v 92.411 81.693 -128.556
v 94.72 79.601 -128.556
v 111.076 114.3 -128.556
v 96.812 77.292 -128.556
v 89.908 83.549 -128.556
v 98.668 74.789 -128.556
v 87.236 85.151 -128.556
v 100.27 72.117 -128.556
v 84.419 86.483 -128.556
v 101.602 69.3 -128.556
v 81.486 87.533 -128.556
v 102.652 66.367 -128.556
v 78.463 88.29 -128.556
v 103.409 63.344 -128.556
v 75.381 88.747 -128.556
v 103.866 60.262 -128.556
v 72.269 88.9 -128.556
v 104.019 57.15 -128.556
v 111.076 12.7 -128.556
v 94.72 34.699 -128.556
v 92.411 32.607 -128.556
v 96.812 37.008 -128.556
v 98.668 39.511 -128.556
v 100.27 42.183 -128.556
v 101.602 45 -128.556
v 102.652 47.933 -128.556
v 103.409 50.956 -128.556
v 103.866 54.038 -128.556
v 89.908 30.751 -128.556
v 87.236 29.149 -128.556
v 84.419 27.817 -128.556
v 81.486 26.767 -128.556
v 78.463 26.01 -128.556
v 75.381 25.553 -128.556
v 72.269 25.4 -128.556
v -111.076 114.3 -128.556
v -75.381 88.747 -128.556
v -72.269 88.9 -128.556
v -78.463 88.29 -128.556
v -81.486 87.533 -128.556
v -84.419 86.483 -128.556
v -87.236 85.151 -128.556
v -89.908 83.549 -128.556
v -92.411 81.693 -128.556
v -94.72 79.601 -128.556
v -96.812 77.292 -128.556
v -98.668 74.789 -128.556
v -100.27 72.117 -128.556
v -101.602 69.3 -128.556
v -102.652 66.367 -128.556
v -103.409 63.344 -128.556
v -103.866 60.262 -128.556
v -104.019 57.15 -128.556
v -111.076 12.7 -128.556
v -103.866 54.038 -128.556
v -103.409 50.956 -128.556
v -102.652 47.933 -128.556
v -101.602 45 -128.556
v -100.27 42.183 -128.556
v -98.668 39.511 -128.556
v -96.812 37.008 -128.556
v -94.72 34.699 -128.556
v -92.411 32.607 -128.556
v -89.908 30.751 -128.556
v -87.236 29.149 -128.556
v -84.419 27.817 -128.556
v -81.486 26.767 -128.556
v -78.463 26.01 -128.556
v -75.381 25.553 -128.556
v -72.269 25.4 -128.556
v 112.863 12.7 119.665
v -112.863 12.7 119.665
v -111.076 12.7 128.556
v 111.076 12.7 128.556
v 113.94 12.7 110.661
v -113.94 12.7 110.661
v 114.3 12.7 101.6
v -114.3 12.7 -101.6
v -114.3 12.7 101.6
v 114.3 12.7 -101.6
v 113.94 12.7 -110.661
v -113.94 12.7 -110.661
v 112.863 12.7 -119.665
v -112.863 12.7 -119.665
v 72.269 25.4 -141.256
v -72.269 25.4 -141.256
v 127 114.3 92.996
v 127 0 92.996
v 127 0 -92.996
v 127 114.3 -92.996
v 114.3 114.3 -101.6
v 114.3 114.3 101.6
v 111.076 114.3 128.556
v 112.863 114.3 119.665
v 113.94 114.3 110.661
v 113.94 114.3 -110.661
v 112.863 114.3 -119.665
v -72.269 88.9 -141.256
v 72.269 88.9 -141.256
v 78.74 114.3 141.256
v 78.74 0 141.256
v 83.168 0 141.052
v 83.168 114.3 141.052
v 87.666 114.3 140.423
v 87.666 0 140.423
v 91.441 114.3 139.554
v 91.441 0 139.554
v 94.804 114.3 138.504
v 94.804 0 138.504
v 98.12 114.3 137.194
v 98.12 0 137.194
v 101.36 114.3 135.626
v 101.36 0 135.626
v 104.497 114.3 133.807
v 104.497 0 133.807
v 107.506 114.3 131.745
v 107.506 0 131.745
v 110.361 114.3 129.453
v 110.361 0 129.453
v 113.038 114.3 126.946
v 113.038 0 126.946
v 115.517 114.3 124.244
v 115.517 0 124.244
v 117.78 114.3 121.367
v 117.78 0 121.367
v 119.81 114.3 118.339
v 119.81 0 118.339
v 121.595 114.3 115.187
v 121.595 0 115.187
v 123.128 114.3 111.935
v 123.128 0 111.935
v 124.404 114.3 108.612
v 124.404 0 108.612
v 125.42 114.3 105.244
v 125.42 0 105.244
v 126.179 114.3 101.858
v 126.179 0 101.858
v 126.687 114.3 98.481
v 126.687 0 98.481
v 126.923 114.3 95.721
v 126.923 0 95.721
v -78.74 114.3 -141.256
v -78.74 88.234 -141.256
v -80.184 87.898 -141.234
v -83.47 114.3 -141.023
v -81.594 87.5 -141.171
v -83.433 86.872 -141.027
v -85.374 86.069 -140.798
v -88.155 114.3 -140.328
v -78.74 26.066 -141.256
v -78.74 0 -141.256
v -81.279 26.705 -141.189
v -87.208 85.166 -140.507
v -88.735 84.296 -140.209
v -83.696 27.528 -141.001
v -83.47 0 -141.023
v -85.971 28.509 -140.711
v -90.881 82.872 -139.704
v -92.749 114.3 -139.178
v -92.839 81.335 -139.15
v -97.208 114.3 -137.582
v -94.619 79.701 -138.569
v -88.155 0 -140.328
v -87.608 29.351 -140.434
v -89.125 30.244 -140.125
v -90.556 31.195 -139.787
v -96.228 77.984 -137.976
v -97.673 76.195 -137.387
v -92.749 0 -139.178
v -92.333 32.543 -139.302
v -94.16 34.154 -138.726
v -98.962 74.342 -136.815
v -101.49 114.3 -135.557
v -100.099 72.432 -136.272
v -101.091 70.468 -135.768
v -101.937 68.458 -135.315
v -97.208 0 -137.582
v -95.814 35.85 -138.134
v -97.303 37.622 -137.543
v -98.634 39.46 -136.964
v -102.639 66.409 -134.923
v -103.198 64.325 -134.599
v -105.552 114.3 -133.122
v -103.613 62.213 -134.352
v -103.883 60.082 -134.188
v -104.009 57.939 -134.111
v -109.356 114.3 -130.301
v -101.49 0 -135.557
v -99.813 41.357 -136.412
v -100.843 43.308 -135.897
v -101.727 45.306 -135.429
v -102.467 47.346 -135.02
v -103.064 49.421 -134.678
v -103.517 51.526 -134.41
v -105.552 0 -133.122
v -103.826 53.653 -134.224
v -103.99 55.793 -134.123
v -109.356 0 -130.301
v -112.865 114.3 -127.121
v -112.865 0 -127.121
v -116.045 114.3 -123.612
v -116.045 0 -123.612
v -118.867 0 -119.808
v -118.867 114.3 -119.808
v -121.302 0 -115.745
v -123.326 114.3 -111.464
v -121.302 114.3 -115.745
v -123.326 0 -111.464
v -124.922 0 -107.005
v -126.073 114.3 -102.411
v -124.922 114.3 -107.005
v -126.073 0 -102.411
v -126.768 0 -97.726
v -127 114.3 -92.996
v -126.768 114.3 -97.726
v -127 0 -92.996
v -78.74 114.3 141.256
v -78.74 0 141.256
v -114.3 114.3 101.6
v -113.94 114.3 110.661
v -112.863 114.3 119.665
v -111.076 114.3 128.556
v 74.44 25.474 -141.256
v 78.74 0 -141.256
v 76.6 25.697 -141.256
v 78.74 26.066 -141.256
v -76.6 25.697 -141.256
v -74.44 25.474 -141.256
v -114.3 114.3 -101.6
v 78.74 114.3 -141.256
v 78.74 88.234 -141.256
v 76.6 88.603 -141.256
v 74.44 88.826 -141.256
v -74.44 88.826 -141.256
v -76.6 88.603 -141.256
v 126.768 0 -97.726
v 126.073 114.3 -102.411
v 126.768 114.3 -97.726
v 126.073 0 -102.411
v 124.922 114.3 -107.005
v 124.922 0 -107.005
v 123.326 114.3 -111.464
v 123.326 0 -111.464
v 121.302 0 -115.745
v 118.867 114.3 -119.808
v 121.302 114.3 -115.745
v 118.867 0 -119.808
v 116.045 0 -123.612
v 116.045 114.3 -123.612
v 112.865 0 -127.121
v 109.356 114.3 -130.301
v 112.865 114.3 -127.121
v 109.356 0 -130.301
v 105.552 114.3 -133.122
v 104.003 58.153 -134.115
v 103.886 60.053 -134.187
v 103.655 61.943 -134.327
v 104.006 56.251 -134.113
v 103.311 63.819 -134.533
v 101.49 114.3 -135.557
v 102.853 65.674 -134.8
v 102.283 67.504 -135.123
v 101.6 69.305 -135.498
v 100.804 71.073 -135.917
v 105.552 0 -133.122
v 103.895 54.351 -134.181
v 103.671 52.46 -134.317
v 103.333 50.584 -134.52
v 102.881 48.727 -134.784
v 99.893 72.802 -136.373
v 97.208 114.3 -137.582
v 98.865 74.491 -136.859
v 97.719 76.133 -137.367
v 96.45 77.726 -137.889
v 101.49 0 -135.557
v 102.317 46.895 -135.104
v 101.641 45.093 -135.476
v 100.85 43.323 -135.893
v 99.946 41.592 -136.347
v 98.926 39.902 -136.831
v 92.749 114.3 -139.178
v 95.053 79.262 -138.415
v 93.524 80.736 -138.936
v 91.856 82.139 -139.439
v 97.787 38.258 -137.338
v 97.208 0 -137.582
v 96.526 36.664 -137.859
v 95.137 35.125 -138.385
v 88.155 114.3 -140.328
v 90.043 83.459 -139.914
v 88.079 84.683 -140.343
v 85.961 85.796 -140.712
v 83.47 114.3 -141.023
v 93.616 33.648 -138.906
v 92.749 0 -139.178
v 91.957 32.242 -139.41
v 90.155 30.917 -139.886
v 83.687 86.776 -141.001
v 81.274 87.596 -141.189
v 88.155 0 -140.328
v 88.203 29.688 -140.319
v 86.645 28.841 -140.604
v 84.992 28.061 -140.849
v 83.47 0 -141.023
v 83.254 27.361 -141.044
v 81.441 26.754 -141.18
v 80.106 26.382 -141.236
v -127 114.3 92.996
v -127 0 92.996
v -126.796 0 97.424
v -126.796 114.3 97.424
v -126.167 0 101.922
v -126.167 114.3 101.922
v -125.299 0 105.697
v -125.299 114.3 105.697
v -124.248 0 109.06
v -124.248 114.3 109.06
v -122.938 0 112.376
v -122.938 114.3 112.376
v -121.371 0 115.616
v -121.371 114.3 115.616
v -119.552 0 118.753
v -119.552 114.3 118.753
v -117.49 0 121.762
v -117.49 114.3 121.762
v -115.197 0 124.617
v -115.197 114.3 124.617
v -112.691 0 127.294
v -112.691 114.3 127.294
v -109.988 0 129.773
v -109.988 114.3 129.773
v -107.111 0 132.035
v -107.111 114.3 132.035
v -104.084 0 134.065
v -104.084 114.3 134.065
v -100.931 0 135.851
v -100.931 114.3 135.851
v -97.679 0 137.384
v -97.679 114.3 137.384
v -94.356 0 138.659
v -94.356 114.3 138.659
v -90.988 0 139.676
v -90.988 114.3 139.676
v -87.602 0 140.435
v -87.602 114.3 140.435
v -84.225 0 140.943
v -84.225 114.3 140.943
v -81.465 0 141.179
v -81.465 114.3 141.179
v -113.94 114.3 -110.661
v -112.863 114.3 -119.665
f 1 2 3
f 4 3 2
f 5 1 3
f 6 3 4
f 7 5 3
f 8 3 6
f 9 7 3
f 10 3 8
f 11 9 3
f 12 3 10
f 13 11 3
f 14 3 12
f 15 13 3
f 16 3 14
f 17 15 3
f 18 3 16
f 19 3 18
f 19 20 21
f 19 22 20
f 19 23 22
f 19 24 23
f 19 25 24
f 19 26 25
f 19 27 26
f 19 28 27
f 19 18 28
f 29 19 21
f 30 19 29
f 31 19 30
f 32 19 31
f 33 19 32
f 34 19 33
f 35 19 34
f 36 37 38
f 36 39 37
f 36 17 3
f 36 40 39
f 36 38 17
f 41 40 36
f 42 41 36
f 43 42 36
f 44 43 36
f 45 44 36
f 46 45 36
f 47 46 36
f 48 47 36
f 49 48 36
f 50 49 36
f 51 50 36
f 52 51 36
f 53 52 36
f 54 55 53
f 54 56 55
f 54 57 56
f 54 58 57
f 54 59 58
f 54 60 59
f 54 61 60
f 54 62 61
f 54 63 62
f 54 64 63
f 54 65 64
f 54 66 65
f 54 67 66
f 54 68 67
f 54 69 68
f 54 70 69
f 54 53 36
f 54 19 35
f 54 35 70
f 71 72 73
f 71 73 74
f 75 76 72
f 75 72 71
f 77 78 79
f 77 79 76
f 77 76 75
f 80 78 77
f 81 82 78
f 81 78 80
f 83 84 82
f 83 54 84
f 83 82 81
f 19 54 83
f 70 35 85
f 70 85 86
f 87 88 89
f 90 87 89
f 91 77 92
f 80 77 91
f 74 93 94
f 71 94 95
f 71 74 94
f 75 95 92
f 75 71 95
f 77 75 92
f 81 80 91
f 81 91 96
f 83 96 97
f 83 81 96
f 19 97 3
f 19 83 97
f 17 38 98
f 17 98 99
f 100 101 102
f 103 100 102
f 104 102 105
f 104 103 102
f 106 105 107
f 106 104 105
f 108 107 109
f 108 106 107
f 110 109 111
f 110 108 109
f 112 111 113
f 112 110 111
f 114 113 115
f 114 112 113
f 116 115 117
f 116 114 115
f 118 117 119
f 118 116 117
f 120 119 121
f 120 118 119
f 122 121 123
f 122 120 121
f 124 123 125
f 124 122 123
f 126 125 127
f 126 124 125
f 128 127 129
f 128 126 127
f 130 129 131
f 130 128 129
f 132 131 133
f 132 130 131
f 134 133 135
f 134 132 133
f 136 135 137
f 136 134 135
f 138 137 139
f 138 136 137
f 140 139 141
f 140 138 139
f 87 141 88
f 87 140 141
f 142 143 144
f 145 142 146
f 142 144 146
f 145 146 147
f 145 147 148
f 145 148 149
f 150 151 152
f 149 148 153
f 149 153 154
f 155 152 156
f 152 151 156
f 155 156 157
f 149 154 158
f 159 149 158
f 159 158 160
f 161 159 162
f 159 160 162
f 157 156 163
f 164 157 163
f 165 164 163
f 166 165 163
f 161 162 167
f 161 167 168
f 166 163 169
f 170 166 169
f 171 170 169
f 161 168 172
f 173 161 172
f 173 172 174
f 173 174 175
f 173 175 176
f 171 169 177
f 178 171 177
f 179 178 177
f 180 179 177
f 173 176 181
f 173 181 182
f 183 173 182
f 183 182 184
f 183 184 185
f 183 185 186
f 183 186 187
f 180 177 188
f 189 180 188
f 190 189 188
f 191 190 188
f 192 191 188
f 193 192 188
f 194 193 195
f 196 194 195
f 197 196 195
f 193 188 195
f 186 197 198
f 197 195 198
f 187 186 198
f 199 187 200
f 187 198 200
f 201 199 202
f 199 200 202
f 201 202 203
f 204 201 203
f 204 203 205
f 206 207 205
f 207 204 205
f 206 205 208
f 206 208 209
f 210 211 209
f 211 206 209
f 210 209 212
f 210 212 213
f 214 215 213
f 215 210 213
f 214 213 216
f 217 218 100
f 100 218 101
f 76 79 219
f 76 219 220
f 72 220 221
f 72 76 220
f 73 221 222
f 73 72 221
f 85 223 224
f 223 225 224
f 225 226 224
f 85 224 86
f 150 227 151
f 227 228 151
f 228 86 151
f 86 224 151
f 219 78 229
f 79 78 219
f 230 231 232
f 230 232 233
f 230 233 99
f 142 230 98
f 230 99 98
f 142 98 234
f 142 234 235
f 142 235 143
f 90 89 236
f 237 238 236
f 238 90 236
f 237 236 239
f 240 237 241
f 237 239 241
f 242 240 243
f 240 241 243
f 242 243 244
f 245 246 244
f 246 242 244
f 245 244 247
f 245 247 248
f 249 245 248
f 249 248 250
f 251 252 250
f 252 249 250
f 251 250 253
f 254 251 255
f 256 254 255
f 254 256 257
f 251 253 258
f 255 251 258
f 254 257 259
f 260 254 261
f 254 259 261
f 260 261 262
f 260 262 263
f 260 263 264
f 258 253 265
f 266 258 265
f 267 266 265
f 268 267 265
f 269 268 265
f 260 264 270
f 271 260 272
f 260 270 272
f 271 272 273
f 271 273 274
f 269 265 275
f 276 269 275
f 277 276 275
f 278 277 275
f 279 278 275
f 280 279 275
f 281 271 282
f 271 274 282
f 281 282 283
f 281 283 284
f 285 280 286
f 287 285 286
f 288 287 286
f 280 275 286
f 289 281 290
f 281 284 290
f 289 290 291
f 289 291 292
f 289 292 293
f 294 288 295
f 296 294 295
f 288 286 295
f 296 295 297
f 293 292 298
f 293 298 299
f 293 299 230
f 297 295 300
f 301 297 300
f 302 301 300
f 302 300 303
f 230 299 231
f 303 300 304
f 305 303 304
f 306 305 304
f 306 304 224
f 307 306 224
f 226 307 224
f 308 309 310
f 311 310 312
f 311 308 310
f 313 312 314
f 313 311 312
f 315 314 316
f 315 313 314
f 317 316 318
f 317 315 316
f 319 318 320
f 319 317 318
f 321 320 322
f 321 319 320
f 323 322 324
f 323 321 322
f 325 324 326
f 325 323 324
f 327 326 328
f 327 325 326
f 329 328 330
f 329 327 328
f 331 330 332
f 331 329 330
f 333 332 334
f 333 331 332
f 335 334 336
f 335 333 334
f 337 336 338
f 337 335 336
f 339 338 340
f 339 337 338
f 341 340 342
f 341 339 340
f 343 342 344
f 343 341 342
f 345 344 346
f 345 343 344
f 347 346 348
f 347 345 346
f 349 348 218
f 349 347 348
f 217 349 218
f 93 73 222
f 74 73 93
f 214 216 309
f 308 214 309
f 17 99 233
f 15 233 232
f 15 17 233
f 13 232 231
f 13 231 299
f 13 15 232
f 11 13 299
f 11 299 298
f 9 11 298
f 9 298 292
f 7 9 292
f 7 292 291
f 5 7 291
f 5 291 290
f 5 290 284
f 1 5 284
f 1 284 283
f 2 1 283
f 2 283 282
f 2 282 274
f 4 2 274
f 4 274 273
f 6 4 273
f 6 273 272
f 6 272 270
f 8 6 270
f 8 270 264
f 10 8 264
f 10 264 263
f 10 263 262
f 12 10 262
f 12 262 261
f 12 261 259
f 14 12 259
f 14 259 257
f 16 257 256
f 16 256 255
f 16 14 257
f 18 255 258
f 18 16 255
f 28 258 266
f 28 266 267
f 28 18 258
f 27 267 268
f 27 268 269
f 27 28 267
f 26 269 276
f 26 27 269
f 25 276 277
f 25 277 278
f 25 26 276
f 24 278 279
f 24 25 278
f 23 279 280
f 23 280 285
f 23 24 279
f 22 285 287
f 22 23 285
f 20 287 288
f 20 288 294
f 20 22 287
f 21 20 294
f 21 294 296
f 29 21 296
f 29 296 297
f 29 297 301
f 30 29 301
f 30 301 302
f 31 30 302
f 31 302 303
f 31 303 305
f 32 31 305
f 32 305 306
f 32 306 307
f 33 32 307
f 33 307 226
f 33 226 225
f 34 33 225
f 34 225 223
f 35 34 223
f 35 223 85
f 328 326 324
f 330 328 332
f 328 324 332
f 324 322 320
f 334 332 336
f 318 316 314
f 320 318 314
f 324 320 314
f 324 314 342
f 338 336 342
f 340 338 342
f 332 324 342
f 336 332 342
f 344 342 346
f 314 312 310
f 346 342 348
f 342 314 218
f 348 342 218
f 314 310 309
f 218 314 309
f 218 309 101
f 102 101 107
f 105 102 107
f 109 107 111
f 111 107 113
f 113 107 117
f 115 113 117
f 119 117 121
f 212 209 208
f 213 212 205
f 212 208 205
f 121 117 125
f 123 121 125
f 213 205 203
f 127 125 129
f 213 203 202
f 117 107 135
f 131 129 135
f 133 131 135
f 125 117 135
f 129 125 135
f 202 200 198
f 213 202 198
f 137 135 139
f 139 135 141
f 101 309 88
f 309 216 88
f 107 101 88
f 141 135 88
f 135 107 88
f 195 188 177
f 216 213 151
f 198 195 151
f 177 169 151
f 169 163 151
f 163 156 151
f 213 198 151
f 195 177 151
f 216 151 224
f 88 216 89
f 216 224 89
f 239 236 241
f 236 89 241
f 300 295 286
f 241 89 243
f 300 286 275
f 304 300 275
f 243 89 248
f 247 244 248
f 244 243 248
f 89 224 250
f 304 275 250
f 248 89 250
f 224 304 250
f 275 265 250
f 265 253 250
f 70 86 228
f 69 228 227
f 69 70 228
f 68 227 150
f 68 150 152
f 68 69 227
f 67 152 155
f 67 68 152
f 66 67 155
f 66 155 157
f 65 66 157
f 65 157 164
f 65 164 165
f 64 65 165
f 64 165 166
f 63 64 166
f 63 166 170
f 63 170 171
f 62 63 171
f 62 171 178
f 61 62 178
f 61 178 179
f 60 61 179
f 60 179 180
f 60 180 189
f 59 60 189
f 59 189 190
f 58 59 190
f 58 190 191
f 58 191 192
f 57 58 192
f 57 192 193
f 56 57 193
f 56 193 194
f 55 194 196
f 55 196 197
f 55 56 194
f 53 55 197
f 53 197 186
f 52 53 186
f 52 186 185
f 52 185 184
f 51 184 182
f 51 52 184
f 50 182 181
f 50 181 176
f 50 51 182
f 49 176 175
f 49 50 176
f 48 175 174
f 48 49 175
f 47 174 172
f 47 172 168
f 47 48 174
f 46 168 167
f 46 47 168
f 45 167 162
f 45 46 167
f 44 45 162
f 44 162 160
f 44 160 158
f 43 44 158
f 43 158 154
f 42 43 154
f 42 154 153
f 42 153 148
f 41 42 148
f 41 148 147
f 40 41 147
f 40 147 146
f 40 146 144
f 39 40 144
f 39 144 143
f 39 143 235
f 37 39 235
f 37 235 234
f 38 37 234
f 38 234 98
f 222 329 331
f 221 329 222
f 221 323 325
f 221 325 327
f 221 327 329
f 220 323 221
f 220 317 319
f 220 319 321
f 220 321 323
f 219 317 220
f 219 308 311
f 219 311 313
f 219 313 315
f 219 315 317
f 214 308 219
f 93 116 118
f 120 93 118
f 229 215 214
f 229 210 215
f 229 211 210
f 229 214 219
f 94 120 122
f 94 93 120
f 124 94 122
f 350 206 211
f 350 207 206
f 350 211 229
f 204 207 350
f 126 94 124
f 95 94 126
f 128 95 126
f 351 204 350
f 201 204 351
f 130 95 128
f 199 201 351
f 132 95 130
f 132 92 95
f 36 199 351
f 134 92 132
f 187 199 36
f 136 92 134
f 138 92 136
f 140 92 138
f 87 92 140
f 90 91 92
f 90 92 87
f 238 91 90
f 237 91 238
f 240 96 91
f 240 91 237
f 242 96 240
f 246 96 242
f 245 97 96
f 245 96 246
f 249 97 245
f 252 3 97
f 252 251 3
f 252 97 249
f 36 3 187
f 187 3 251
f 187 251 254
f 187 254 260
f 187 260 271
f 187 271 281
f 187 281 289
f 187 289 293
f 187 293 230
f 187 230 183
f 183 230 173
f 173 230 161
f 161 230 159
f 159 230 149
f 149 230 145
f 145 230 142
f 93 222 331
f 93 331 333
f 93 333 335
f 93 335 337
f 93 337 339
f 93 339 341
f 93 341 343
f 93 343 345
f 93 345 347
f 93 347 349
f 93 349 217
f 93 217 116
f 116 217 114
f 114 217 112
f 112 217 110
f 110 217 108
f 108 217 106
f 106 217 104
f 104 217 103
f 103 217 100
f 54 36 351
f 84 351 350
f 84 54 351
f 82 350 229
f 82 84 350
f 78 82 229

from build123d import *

# Parameters (mm, degrees)
BOSS_EXTRUDE1_DEPTH = 114.3
SHELL1_T            = -12.7
CUT_EXTRUDE1_DEPTH  = 222.690489912
FILLET1_R           = 48.26
FILLET2_R           = 48.26


with BuildPart() as part:
    # Sketch2 → Boss-Extrude1 (new body)
    with BuildSketch(Plane(origin=(0, 0, 0), x_dir=(1, 0, 0), z_dir=(0, 1, 0))):
        with BuildLine():
            Line((-127, 101.6), (-127, -101.6))
            ThreePointArc((-127, -101.6), (-125.402452129, -121.680463142), (-120.65, -141.25573729))
            Line((-120.65, -141.25573729), (120.65, -141.25573729))
            ThreePointArc((120.65, -141.25573729), (125.402452129, -121.680463142), (127, -101.6))
            Line((127, -101.6), (127, 101.6))
            ThreePointArc((127, 101.6), (125.402452129, 121.680463142), (120.65, 141.25573729))
            Line((120.65, 141.25573729), (-120.65, 141.25573729))
            ThreePointArc((-120.65, 141.25573729), (-125.402452129, 121.680463142), (-127, 101.6))
        make_face()
    extrude(amount=BOSS_EXTRUDE1_DEPTH)

    # Shell1
    shell1_openings = [part.faces().sort_by_distance(p)[0] for p in [
        (0, 114.3, 0),
    ]]
    offset(amount=SHELL1_T, openings=shell1_openings, kind=Kind.INTERSECTION)

    # Sketch3 → Cut-Extrude1 (cut, through all)
    # profile 1 of 2: a face of its own
    with BuildSketch(Plane.XY):
        with BuildLine():
            Line((-72.268980264, 88.9), (72.268980264, 88.9))
            ThreePointArc((72.268980264, 88.9), (104.018980264, 57.15), (72.268980264, 25.4))
            Line((72.268980264, 25.4), (-72.268980264, 25.4))
            ThreePointArc((-72.268980264, 25.4), (-104.018980264, 57.15), (-72.268980264, 88.9))
        make_face()
        with BuildLine():
            ThreePointArc((72.268980264, 31.75), (97.668980264, 57.15), (72.268980264, 82.55))
            Line((72.268980264, 82.55), (-72.268980264, 82.55))
            ThreePointArc((-72.268980264, 82.55), (-97.668980264, 57.15), (-72.268980264, 31.75))
            Line((-72.268980264, 31.75), (72.268980264, 31.75))
        make_face(mode=Mode.SUBTRACT)
    # profile 2 of 2: a face of its own
    with BuildSketch(Plane.XY):
        with BuildLine():
            Line((-72.268980264, 31.75), (72.268980264, 31.75))
            ThreePointArc((72.268980264, 31.75), (97.668980264, 57.15), (72.268980264, 82.55))
            Line((72.268980264, 82.55), (-72.268980264, 82.55))
            ThreePointArc((-72.268980264, 82.55), (-97.668980264, 57.15), (-72.268980264, 31.75))
        make_face()
    extrude(amount=-CUT_EXTRUDE1_DEPTH, mode=Mode.SUBTRACT)

    # Fillet1
    fillet1_edges = [part.edges().sort_by_distance(p)[0] for p in [
        (120.65, 57.15, 141.25573729),
        (-120.65, 57.15, 141.25573729),
    ]]
    fillet(fillet1_edges, radius=FILLET1_R)

    # Fillet2
    # the kernel refuses this fillet: 48.26 mm, written as the material it takes off along each edge
    with BuildSketch(Plane(origin=(-120.65, -121.689926144, -141.25573729), x_dir=(-0.13045451257138782, 0, 0.9914542955425437), z_dir=(0, 1, 0))) as fillet2_piece_1:
        with BuildLine():
            CenterArc((42.380235681, 47.847584303), FILLET2_R, 187.49585764, 90)
            Line((-5.467348622, 41.551849526), (-10.252107052, 40.922276049))
            Line((-10.252107052, 40.922276049), (-4.78475843, -0.629573478))
            Line((-4.78475843, -0.629573478), (-0.895945537, -4.742104764))
            ThreePointArc((-0.895945537, -4.742104764), (40.774810711, -5.907223328), (49.305543935, -4.78475843))
            Line((49.305543935, -4.78475843), (48.675970458, 0))
        make_face()
    extrude(amount=357.679852289, mode=Mode.SUBTRACT)
    with BuildSketch(Plane(origin=(120.65, -121.689926144, -141.25573729), x_dir=(-1, 0, 0), z_dir=(0, 1, 0))) as fillet2_piece_2:
        with BuildLine():
            CenterArc((41.91, 48.26), FILLET2_R, 180, 90)
            Line((-6.35, 48.26), (-11.176, 48.26))
            ThreePointArc((-11.176, 48.26), (-11.176, 39.65573729), (-4.5847, -1.506918017))
            Line((-4.5847, -1.506918017), (0, -4.826))
            Line((0, -4.826), (41.91, -4.826))
            Line((41.91, -4.826), (41.91, 0))
        make_face()
    extrude(amount=357.679852289, mode=Mode.SUBTRACT)


solid = part.part
